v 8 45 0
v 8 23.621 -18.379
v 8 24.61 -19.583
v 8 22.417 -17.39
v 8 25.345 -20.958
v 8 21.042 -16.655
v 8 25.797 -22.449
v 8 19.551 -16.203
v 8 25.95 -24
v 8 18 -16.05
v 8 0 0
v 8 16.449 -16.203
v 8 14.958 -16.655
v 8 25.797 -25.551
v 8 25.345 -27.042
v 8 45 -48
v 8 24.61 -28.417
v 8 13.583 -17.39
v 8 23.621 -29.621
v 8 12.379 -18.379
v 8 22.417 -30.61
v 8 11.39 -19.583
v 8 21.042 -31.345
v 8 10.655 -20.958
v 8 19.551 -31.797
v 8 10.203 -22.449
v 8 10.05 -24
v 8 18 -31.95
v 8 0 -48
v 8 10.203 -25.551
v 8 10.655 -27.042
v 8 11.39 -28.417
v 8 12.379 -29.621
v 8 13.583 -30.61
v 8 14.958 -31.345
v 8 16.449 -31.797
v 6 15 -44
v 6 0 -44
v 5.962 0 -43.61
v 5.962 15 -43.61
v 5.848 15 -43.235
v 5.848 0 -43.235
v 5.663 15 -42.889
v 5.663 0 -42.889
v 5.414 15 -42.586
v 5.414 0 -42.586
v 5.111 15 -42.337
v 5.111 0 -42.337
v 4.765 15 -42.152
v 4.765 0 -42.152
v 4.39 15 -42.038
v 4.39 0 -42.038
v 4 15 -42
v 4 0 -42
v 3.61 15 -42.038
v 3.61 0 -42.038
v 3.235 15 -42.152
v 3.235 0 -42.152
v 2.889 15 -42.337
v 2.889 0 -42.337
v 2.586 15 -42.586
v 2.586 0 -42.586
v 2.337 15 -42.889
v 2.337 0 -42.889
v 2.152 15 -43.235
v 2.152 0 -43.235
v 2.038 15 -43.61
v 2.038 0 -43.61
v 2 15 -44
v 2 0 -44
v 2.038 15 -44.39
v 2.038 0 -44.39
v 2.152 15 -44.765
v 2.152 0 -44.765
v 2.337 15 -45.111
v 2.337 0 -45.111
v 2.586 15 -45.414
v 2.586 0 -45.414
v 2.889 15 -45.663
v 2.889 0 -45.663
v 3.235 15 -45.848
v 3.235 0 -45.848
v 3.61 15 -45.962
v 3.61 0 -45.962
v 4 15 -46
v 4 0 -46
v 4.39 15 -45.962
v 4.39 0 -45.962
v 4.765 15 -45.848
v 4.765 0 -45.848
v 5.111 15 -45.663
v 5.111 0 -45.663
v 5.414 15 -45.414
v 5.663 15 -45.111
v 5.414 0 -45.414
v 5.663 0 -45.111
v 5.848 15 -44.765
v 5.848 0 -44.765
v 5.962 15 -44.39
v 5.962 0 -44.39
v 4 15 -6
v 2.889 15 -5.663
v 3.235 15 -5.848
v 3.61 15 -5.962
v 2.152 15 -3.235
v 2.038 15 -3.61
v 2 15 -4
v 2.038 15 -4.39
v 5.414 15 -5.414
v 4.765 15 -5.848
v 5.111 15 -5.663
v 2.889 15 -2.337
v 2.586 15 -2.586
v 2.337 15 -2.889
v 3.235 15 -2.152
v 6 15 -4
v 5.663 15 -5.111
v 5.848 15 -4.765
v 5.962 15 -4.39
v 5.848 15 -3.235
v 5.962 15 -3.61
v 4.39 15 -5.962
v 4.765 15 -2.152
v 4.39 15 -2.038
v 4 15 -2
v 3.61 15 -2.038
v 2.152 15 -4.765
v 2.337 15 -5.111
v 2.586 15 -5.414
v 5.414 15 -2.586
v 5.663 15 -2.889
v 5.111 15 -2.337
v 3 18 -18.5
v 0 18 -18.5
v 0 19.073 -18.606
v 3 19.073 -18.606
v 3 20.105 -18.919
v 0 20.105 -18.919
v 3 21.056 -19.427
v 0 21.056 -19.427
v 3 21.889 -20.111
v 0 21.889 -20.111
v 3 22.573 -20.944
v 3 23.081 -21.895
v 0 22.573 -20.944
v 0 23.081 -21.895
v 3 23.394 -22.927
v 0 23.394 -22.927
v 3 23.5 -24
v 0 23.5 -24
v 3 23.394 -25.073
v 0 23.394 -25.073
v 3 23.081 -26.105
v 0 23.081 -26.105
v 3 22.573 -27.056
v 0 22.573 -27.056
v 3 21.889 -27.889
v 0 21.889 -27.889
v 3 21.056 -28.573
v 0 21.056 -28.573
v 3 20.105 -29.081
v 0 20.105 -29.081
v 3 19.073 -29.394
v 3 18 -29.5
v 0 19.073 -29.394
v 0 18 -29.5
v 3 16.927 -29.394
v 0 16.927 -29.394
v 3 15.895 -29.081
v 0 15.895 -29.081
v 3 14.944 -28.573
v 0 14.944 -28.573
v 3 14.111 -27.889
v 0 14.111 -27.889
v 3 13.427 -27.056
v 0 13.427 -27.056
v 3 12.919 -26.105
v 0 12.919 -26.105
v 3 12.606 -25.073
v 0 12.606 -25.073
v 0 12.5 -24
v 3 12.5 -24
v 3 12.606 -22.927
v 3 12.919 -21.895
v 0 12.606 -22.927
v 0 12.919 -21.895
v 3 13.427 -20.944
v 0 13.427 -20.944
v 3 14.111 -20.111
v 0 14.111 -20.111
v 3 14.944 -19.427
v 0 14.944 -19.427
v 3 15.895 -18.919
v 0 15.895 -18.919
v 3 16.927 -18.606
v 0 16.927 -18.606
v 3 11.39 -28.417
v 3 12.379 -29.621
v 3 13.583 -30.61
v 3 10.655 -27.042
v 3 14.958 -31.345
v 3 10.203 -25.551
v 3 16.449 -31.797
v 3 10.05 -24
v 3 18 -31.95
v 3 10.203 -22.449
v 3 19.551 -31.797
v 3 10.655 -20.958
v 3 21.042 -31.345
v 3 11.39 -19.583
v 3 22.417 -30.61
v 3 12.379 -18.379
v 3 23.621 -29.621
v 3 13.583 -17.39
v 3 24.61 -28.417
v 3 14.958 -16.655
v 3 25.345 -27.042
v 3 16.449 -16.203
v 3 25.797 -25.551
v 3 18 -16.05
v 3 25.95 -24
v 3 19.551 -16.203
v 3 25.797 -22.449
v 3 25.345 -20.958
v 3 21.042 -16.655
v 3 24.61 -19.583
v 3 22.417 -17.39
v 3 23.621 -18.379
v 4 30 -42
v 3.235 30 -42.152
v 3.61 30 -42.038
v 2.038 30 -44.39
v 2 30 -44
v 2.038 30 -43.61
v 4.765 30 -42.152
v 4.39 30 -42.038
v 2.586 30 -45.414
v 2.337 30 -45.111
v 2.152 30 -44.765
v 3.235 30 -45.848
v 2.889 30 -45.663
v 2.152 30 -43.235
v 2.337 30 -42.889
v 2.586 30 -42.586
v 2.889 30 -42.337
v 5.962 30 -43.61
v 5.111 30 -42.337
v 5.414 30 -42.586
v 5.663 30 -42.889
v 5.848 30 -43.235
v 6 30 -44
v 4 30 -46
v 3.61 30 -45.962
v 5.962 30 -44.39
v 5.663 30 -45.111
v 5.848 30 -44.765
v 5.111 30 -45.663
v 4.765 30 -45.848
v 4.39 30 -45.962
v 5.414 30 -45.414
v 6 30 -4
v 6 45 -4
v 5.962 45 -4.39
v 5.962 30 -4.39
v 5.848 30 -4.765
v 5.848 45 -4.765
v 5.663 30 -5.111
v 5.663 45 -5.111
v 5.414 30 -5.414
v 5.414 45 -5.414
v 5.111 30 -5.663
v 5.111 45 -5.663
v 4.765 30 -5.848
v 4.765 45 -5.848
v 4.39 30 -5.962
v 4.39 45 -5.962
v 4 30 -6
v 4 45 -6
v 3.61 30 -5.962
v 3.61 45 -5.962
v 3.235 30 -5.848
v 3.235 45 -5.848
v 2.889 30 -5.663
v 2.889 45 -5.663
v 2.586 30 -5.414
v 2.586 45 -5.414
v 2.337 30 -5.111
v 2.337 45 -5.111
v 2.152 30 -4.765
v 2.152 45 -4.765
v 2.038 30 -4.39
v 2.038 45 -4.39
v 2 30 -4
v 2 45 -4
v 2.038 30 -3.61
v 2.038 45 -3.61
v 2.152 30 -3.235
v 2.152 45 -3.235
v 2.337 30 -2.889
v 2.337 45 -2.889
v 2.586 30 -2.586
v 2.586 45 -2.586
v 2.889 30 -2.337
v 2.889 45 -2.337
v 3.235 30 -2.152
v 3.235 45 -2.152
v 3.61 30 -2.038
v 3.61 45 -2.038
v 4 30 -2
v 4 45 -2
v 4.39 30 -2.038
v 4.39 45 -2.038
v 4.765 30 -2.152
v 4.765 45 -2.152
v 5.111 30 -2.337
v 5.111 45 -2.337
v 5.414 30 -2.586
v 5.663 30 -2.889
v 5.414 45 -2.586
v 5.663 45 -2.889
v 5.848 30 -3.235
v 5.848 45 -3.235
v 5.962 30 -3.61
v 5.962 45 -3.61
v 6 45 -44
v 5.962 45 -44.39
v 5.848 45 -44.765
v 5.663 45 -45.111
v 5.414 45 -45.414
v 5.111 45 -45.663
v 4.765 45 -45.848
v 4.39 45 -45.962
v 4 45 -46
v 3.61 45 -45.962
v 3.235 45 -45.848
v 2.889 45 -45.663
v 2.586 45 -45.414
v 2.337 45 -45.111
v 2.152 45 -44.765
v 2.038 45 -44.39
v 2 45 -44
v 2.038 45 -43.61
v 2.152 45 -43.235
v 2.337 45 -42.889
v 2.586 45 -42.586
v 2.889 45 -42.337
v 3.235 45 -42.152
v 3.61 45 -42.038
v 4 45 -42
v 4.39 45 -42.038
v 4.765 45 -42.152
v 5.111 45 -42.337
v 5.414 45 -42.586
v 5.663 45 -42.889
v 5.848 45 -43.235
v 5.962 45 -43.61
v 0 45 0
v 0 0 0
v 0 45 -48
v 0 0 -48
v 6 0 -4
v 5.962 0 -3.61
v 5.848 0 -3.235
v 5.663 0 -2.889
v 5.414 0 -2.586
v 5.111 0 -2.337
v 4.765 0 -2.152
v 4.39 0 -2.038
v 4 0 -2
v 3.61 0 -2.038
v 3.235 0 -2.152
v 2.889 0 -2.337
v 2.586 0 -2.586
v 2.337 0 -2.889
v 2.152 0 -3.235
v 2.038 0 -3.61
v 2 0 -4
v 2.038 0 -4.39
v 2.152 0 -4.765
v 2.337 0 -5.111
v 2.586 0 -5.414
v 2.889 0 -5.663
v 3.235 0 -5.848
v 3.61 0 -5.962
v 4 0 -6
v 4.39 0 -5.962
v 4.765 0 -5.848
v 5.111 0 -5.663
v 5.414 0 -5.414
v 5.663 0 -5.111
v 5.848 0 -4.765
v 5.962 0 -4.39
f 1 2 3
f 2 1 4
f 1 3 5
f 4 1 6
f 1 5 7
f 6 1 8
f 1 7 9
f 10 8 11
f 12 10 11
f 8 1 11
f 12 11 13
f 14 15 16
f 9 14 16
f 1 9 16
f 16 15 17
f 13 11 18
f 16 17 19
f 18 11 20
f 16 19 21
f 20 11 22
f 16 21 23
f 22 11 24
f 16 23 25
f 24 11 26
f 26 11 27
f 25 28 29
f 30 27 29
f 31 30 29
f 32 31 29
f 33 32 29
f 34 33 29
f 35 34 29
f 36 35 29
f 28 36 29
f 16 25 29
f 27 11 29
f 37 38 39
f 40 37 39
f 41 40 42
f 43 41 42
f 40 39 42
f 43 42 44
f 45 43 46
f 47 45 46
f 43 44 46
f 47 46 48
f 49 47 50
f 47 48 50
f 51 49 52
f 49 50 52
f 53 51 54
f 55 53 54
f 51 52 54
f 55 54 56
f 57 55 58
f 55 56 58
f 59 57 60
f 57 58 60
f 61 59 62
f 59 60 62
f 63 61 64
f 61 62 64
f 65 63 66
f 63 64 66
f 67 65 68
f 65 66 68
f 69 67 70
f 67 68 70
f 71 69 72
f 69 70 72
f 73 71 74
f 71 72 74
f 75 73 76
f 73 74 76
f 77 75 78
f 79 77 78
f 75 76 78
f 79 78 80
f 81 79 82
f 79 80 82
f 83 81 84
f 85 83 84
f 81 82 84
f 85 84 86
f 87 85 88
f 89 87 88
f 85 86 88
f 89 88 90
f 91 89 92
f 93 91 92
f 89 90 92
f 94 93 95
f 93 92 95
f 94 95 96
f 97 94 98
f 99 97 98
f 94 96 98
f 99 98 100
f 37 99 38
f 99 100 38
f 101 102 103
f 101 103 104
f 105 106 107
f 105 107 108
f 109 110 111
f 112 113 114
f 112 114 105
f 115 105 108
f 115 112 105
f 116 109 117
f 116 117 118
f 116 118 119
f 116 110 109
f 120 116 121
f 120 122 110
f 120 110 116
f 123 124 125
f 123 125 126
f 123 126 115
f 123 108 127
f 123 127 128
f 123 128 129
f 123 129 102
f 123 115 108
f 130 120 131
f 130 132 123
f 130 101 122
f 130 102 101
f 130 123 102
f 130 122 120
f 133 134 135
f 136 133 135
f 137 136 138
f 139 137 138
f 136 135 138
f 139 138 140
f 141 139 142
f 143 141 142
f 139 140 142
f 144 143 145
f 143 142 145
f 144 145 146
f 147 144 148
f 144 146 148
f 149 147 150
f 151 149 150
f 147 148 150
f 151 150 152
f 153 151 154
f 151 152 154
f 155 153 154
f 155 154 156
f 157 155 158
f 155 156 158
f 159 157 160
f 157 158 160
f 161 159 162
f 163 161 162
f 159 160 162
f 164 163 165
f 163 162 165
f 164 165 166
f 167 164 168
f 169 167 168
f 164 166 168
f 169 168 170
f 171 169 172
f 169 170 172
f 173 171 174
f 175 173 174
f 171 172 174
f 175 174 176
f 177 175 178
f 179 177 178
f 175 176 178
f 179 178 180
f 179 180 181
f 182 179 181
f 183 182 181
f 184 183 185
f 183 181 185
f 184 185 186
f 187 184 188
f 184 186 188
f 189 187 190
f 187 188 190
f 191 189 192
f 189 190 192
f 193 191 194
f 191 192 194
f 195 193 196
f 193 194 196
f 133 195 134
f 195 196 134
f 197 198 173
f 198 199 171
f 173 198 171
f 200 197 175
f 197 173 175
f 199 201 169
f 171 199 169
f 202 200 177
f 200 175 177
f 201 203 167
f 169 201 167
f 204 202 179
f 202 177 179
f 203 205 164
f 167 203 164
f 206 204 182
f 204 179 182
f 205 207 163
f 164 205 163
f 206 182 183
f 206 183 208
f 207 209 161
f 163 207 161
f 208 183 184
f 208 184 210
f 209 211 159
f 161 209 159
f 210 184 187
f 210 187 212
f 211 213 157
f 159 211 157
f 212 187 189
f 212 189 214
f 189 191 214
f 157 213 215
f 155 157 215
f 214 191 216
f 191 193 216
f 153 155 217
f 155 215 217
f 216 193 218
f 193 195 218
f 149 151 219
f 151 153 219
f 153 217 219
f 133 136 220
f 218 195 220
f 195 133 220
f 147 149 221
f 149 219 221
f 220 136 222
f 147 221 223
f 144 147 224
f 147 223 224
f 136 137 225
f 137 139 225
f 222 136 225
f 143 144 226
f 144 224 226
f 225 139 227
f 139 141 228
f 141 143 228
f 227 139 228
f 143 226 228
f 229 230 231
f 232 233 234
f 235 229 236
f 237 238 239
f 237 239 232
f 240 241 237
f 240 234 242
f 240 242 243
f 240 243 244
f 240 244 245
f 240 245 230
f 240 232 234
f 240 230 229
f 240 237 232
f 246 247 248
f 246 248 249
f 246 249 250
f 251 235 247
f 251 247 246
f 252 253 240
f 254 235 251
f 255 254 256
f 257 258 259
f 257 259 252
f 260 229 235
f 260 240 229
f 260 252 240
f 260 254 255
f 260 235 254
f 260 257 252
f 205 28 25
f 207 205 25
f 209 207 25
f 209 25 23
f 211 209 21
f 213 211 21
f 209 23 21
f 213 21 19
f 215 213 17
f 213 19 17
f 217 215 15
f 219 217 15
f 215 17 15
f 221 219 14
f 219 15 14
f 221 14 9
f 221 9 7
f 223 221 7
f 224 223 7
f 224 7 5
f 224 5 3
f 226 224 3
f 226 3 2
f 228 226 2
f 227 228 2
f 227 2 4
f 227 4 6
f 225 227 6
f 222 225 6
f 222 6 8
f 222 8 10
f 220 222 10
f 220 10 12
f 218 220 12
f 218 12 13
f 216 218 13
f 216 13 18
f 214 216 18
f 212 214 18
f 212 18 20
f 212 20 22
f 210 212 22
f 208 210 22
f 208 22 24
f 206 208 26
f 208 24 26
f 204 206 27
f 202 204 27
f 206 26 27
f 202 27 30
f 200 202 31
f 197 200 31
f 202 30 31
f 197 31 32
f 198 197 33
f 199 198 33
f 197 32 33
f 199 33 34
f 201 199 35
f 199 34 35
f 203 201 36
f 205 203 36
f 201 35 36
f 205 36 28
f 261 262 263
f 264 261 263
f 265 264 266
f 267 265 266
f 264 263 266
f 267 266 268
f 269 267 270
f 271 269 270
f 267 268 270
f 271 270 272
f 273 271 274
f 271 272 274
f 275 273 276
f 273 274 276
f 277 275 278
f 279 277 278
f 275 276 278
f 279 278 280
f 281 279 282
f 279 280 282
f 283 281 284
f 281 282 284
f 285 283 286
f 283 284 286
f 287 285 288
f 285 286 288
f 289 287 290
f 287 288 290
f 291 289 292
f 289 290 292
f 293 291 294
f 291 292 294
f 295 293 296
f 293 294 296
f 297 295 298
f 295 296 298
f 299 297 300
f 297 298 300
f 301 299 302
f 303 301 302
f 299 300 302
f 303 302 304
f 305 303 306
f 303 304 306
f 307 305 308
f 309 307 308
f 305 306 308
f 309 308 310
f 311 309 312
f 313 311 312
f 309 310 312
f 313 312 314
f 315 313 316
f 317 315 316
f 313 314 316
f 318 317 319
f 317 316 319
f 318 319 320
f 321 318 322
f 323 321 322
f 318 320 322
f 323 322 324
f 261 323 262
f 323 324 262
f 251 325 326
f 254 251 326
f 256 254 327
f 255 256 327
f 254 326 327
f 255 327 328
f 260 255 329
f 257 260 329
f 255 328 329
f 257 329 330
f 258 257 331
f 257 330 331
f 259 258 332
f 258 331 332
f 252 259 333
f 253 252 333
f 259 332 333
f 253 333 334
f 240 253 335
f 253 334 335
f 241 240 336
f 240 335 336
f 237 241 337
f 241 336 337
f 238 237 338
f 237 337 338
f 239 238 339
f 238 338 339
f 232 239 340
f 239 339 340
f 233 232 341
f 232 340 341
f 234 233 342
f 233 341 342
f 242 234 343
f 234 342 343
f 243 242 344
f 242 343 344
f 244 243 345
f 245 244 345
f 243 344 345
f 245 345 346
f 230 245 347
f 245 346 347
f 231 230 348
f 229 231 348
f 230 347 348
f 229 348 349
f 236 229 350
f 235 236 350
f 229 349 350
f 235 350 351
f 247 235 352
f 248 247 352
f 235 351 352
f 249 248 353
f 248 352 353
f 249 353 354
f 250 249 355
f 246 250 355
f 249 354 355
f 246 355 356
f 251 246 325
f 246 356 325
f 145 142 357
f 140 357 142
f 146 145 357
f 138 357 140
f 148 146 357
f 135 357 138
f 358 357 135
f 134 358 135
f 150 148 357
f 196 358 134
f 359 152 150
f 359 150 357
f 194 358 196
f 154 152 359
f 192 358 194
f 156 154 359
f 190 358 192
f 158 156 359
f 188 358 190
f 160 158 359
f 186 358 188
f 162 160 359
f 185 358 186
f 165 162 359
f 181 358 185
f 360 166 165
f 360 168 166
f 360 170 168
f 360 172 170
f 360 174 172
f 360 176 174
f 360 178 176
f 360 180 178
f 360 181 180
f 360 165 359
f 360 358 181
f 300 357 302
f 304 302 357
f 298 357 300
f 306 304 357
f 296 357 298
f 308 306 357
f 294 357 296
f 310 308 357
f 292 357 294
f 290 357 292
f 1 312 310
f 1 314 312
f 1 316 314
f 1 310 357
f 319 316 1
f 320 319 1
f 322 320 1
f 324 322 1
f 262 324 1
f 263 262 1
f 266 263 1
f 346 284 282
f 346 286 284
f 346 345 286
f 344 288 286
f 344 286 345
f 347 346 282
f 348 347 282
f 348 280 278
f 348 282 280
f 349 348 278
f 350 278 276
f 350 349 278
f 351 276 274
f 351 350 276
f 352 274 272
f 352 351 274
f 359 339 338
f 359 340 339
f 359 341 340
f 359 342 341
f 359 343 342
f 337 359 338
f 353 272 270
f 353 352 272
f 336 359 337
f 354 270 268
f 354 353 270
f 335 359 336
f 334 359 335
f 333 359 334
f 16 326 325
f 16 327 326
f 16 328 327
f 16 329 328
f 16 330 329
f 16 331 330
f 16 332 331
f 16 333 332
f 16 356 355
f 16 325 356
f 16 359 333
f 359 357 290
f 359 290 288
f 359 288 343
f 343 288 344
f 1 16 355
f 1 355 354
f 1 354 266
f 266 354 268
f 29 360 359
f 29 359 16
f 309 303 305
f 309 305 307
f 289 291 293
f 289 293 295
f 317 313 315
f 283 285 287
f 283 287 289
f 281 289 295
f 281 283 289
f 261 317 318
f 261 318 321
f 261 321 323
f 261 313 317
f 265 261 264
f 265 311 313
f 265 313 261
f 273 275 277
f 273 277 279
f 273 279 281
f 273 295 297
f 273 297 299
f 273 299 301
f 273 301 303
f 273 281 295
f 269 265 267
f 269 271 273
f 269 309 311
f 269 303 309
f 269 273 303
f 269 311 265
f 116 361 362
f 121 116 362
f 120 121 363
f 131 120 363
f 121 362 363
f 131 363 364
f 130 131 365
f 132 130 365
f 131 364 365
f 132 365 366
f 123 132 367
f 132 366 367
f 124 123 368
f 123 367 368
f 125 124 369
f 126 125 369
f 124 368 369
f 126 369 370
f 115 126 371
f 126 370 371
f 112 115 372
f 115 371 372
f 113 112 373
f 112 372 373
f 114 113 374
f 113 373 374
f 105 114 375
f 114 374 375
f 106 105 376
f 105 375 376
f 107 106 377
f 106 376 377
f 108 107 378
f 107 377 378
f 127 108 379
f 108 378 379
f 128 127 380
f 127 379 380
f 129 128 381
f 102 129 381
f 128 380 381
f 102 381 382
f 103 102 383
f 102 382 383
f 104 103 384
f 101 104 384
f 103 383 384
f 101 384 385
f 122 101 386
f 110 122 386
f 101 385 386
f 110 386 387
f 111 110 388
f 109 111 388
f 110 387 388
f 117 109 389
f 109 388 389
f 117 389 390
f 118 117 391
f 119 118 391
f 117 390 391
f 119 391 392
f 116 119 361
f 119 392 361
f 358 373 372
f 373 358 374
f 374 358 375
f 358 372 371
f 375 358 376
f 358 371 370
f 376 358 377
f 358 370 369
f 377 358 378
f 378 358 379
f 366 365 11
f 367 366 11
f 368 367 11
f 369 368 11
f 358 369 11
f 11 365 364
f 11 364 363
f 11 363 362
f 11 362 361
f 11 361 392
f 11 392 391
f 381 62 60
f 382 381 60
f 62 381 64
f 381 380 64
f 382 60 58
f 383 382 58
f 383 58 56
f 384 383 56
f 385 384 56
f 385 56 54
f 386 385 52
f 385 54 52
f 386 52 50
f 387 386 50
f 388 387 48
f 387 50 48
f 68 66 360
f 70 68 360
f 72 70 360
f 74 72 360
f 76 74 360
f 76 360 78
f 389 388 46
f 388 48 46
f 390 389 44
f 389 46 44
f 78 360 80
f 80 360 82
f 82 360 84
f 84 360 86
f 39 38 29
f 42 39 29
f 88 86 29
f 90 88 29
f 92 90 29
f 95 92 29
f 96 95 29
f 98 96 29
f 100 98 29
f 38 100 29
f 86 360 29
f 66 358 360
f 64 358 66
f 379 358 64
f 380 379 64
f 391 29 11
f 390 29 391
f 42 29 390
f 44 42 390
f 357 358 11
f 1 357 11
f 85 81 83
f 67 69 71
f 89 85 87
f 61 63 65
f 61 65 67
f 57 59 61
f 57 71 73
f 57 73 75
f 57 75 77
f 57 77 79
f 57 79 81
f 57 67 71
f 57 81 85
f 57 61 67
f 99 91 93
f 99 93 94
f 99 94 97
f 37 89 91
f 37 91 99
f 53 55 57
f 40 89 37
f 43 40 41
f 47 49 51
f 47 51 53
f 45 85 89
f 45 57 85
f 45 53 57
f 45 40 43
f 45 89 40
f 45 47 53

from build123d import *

# Parameters (mm, degrees)
ESQUISSE1_W             = 8
ESQUISSE1_H             = 48
BOSS_EXTRU_1_DEPTH      = 45
ESQUISSE28_R            = 7.95
ENL_V_MAT_EXTRU_1_DEPTH = 10
ESQUISSE29_R            = 8.1
ESQUISSE29_R_2          = 5.5
BOSS_EXTRU_2_DEPTH      = 3
ESQUISSE30_R            = 2
ENL_V_MAT_EXTRU_2_DEPTH = 15
ESQUISSE31_R            = 2
ENL_V_MAT_EXTRU_3_DEPTH = 15


with BuildPart() as part:
    # Esquisse1 → Boss.-Extru.1 (new body)
    with BuildSketch(Plane(origin=(0, 0, 0), x_dir=(1, 0, 0), z_dir=(0, 1, 0))):
        with Locations((4, 24)):
            Rectangle(ESQUISSE1_W, ESQUISSE1_H)
    extrude(amount=BOSS_EXTRU_1_DEPTH)

    # Esquisse28 → Enl_v. mat.-Extru.1 (cut)
    with BuildSketch(Plane(origin=(8, 0, 0), x_dir=(0, 0, -1), z_dir=(1, 0, 0))):
        with Locations((24, 18)):
            Circle(ESQUISSE28_R)
    extrude(amount=-ENL_V_MAT_EXTRU_1_DEPTH, mode=Mode.SUBTRACT)

    # Esquisse29 → Boss.-Extru.2 (add)
    with BuildSketch(Plane.ZY):
        with Locations((-24, 18)):
            Circle(ESQUISSE29_R)
        with Locations((-24, 18)):
            Circle(ESQUISSE29_R_2, mode=Mode.SUBTRACT)
    extrude(amount=-BOSS_EXTRU_2_DEPTH)

    # Esquisse30 → Enl_v. mat.-Extru.2 (cut)
    with BuildSketch(Plane.XZ):
        with Locations((4, -44)):
            Circle(ESQUISSE30_R)
        with Locations((4, -4)):
            Circle(ESQUISSE30_R)
    extrude(amount=-ENL_V_MAT_EXTRU_2_DEPTH, mode=Mode.SUBTRACT)

    # Esquisse31 → Enl_v. mat.-Extru.3 (cut)
    with BuildSketch(Plane(origin=(0, 45, 0), x_dir=(1, 0, 0), z_dir=(0, 1, 0))):
        with Locations((4, 44)):
            Circle(ESQUISSE31_R)
        with Locations((4, 4)):
            Circle(ESQUISSE31_R)
    extrude(amount=-ENL_V_MAT_EXTRU_3_DEPTH, mode=Mode.SUBTRACT)


solid = part.part
